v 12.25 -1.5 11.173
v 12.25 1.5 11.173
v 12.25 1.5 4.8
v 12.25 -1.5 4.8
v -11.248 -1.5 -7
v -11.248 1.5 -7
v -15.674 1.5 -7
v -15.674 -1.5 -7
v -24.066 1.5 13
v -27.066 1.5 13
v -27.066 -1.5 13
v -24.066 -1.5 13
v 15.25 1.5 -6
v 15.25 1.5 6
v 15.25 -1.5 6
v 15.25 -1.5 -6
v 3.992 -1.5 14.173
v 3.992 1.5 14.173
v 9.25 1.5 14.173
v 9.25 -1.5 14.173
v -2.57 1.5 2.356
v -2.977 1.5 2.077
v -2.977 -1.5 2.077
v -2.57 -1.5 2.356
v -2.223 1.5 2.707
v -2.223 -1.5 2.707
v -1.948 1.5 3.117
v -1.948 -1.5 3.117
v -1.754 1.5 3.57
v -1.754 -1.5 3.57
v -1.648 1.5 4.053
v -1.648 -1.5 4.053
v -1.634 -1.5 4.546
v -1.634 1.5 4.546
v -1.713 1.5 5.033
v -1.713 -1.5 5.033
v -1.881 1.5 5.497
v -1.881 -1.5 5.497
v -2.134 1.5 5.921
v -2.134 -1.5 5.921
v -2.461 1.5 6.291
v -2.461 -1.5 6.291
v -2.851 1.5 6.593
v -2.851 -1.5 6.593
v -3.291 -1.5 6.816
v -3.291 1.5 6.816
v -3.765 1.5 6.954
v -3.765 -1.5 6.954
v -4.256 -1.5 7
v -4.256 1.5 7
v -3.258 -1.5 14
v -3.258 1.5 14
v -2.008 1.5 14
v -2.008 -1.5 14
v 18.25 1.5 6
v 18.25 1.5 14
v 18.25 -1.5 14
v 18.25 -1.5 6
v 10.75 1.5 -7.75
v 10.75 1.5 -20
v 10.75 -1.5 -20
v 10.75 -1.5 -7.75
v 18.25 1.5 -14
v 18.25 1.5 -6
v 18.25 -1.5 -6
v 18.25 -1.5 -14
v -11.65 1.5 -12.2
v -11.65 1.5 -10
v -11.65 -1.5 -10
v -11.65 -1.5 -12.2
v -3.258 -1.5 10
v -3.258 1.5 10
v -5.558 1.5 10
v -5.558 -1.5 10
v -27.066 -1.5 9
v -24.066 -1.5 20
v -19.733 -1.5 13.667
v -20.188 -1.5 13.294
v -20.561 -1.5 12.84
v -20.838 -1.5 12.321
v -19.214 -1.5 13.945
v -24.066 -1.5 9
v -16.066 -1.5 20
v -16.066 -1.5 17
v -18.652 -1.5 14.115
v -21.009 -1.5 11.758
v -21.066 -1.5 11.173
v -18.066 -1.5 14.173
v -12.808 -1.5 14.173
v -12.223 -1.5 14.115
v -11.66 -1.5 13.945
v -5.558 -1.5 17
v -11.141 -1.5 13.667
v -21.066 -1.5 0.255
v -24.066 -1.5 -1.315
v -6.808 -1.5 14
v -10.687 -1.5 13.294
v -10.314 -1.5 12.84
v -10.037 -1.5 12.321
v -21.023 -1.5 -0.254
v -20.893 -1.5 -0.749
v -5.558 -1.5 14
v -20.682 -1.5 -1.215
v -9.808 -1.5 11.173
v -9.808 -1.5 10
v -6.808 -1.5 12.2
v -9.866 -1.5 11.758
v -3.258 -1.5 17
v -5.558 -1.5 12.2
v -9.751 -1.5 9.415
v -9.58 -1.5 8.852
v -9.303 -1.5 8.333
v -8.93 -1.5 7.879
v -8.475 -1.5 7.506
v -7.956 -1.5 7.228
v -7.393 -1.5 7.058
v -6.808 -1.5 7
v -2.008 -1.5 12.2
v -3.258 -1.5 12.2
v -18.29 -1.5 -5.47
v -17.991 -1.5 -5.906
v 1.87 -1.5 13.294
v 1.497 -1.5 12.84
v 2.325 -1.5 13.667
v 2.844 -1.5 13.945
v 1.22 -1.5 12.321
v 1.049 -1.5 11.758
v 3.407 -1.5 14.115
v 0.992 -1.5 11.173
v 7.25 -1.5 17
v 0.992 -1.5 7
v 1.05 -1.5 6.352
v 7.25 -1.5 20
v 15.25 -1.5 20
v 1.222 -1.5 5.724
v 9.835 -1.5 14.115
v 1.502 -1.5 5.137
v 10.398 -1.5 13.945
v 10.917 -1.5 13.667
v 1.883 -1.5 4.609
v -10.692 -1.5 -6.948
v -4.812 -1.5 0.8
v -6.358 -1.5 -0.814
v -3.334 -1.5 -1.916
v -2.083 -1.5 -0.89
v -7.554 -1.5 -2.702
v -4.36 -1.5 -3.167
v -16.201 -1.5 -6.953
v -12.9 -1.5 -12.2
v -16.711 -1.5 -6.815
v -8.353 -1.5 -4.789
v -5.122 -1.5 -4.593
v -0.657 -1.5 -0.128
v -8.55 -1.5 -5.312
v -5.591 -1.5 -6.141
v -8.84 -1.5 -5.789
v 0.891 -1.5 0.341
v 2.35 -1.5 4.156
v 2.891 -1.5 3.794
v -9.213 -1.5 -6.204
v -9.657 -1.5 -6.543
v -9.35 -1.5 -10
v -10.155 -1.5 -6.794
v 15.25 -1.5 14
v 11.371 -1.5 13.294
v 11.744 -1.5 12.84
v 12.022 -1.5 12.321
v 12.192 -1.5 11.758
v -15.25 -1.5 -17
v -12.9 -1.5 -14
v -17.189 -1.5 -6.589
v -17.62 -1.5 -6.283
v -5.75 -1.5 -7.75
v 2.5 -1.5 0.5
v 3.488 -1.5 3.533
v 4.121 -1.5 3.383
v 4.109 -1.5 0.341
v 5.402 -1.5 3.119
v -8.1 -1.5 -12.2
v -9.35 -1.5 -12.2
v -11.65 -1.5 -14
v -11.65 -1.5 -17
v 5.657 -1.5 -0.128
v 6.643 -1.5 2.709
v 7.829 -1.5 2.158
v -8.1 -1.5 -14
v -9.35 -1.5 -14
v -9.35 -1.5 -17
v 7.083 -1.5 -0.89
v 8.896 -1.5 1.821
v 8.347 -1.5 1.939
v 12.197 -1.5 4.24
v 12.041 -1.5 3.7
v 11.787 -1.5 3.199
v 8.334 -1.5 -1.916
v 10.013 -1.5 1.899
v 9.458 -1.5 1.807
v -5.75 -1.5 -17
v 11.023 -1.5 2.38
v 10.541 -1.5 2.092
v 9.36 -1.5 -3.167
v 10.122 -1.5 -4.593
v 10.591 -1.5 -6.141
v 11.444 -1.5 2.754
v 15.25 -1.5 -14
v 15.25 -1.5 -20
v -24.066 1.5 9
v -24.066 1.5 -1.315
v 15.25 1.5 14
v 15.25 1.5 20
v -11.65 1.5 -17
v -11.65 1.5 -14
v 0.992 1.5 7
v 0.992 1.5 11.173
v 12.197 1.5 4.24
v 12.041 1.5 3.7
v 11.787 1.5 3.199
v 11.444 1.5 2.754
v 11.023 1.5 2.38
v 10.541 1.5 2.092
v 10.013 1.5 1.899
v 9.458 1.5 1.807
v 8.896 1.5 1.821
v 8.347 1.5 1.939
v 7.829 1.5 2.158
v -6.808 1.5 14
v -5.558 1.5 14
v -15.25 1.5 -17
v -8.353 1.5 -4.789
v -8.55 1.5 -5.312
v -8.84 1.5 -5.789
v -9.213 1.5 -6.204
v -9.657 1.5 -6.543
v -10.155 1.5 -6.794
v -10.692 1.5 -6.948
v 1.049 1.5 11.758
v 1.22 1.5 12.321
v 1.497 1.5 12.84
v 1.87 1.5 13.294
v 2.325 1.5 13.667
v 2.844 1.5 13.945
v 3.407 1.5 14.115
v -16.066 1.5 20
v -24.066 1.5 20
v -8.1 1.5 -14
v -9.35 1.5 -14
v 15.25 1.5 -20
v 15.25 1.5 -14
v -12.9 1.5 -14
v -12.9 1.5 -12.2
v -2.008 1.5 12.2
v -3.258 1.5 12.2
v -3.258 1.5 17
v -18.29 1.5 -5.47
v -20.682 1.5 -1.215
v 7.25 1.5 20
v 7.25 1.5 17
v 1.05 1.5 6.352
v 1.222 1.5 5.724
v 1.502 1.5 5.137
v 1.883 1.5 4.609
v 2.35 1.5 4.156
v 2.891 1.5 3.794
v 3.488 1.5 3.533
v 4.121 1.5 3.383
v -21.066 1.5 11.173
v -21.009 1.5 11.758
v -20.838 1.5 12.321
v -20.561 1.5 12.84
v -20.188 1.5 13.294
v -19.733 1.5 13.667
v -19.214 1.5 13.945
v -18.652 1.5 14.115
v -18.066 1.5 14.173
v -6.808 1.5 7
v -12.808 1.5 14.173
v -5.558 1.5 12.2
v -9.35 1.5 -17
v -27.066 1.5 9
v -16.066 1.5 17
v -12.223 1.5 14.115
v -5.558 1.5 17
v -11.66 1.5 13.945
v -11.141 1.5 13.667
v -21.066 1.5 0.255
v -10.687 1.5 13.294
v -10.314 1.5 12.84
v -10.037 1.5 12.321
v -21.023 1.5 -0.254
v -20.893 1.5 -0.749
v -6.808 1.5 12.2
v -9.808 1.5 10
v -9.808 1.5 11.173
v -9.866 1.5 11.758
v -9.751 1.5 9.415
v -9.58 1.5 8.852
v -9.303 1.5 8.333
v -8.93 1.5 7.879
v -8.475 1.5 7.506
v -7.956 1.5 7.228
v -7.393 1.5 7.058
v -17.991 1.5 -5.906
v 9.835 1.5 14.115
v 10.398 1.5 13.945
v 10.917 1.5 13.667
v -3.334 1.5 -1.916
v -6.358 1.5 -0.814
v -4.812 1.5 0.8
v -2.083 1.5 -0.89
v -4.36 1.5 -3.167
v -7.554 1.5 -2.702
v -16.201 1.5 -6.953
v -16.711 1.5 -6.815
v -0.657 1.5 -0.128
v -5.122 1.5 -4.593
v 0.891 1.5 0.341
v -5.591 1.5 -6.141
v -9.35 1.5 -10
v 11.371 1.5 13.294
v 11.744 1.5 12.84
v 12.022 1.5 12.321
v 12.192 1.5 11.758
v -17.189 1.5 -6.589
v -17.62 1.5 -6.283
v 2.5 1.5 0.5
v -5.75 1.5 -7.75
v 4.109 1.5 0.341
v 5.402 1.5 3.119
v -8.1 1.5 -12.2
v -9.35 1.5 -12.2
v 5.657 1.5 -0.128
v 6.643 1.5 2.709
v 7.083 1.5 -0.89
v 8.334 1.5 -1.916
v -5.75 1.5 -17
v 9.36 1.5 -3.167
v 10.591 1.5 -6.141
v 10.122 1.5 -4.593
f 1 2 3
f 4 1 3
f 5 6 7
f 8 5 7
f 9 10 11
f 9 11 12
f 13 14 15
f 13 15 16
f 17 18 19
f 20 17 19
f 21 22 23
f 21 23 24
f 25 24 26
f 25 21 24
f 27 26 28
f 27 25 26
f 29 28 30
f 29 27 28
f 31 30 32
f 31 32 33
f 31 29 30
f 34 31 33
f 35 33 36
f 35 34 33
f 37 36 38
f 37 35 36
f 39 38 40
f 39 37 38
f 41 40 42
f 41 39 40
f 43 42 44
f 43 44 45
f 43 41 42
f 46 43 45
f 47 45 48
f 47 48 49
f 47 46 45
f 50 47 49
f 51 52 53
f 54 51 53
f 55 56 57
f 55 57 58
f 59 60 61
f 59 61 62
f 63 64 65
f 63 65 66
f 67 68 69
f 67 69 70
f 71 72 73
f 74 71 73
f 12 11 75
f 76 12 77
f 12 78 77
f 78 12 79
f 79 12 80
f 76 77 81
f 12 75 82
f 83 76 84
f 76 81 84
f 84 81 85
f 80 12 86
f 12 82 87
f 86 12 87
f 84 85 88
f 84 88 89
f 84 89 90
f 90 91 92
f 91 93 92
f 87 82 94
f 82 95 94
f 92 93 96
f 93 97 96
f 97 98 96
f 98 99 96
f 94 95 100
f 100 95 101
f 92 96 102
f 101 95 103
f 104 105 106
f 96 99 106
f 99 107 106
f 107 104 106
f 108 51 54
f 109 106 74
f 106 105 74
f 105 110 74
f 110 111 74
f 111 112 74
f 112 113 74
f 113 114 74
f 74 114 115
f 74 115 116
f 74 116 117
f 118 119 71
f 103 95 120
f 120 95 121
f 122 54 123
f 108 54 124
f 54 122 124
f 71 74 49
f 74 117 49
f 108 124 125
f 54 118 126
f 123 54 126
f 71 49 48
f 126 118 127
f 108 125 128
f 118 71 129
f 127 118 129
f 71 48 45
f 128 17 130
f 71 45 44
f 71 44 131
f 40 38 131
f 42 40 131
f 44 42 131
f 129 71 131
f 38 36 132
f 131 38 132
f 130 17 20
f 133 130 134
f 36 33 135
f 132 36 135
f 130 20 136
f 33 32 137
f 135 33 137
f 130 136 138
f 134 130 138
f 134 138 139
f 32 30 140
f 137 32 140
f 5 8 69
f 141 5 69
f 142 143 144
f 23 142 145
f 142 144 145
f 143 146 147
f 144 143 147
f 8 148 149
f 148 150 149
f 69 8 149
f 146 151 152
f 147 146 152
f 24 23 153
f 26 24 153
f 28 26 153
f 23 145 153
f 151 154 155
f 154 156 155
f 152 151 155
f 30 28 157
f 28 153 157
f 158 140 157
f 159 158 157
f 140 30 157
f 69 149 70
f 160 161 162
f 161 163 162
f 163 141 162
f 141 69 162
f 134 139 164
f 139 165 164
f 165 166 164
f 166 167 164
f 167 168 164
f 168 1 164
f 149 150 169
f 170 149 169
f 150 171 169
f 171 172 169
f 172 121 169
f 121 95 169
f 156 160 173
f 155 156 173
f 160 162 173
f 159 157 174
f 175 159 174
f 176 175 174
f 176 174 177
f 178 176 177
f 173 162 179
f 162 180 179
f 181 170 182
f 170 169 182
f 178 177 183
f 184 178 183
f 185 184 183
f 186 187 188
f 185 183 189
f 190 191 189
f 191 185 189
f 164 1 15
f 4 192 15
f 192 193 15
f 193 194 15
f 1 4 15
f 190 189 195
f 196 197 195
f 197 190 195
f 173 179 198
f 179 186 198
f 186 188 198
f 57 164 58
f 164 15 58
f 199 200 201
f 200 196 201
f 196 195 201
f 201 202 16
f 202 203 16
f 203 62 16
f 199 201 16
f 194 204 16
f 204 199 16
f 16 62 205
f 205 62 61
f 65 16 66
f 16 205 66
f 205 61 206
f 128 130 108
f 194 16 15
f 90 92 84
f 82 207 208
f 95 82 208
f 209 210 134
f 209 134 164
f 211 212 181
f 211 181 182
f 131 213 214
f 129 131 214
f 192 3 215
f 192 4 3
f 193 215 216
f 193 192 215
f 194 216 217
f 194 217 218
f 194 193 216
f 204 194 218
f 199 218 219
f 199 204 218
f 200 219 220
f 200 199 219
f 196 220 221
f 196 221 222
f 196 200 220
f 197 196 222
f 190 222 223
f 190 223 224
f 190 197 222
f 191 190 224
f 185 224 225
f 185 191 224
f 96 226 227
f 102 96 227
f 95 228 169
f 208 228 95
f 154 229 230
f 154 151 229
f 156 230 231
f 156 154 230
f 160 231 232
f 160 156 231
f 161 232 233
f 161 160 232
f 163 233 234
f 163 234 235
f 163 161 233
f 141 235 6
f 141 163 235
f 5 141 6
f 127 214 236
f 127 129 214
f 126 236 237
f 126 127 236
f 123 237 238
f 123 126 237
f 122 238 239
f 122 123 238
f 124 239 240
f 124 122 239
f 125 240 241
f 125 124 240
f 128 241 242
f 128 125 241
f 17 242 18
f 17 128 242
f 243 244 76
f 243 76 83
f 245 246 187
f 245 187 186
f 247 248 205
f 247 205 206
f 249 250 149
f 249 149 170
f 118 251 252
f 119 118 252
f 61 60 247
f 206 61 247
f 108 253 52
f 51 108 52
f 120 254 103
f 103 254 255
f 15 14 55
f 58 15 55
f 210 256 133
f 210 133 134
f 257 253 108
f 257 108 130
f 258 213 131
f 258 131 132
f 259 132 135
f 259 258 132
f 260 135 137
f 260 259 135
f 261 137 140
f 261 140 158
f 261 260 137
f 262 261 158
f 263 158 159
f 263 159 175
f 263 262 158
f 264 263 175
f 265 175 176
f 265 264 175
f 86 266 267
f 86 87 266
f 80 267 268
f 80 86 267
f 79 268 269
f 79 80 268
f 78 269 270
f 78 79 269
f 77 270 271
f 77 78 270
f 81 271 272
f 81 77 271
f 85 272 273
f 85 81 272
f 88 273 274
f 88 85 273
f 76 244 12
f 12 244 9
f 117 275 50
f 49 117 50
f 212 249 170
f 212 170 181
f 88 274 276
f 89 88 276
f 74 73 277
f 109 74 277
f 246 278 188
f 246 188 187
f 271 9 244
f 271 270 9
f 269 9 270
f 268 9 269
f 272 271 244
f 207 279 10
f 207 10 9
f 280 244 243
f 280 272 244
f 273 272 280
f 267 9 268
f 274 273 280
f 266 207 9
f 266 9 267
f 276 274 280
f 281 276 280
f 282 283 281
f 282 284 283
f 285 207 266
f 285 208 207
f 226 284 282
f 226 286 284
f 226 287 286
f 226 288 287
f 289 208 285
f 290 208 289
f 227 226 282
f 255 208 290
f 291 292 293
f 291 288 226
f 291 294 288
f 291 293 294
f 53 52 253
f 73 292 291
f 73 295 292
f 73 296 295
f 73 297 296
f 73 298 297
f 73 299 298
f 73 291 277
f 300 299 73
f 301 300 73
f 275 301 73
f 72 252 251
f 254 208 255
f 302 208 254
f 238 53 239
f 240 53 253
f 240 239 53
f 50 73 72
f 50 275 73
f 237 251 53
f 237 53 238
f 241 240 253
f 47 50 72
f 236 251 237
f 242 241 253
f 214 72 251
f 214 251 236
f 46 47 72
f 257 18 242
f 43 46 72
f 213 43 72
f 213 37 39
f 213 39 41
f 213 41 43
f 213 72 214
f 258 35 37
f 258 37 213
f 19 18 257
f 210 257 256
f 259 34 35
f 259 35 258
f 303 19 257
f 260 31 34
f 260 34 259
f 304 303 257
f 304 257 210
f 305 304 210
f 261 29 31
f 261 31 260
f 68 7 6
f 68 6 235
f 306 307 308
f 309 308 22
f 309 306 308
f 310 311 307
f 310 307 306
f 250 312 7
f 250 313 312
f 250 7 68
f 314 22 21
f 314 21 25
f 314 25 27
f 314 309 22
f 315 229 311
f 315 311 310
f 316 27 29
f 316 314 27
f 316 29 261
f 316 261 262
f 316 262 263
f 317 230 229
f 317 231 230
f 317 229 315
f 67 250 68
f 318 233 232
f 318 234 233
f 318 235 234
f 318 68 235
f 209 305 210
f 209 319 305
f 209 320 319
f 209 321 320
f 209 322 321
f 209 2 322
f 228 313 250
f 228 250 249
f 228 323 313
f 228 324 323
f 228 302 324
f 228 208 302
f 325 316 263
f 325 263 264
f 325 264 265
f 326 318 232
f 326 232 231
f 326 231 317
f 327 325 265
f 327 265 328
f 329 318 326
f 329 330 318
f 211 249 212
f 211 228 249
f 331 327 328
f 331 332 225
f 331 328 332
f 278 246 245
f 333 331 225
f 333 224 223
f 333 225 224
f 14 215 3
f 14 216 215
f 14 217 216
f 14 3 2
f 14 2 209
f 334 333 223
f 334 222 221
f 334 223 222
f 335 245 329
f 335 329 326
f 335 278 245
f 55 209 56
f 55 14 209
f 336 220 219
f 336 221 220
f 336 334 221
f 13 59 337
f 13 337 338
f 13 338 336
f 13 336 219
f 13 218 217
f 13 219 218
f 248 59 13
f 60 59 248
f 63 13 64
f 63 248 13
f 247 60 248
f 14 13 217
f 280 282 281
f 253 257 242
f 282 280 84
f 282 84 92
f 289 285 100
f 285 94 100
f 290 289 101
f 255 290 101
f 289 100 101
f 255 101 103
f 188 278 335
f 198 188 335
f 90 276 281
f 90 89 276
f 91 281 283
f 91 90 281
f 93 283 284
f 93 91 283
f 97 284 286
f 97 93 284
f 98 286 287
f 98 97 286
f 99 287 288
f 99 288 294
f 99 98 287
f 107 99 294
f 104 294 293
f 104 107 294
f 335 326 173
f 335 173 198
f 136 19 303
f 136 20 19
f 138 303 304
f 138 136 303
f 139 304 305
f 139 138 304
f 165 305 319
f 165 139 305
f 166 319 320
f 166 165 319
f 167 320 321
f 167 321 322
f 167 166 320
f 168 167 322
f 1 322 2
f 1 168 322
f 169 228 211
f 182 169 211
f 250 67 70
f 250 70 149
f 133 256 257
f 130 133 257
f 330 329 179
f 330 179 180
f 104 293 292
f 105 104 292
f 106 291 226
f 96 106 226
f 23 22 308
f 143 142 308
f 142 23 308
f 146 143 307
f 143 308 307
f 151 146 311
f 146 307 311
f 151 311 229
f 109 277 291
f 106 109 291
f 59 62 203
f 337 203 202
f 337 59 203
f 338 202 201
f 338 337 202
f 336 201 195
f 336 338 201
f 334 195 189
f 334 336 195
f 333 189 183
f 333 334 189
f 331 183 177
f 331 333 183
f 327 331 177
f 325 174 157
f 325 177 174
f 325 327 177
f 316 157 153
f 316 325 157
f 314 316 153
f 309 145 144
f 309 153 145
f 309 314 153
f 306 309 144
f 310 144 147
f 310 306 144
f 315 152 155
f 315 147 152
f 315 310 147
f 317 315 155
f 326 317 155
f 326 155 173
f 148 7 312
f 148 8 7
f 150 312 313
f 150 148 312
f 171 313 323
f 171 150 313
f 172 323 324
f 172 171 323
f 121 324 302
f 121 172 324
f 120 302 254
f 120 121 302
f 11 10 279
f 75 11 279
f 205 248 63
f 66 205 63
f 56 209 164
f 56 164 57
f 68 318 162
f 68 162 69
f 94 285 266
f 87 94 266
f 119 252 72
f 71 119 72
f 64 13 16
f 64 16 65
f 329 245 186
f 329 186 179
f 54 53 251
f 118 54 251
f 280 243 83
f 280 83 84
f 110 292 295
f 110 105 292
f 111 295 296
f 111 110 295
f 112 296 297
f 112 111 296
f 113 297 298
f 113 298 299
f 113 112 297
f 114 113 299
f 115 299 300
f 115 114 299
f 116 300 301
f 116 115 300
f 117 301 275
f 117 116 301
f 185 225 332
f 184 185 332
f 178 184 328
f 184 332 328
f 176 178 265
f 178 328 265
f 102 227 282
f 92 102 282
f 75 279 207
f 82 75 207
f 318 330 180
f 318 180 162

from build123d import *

# Parameters (mm, degrees)
SKETCH1_W           = 30.5
SKETCH1_H           = 34
BOSS_EXTRUDE1_DEPTH = 1.5
BOSS_EXTRUDE2_DEPTH = 3
SKETCH3_W           = 3
SKETCH3_H           = 8
SKETCH3_W_2         = 8
SKETCH3_H_2         = 3
BOSS_EXTRUDE3_DEPTH = 3
CUT_EXTRUDE1_DEPTH  = 4.0000001
CUT_EXTRUDE2_DEPTH  = 4.0000001
SKETCH6_W           = 8
SKETCH6_H           = 3
CUT_EXTRUDE3_DEPTH  = 4.0000001
CUT_EXTRUDE4_DEPTH  = 4.0000001
CUT_EXTRUDE6_DEPTH  = 4.0000001
SKETCH9_W           = 3
SKETCH9_H           = 4
BOSS_EXTRUDE4_DEPTH = 3
CUT_EXTRUDE7_DEPTH  = 4
FILLET1_R           = 3
BOSS_EXTRUDE5_DEPTH = 3


with BuildPart() as part:
    # Sketch1 → Boss-Extrude1 (new body, symmetric)
    with BuildSketch(Plane(origin=(0, 0, 0), x_dir=(1, 0, 0), z_dir=(0, 1, 0))):
        Rectangle(SKETCH1_W, SKETCH1_H)
    extrude(amount=BOSS_EXTRUDE1_DEPTH, both=True)

    # Sketch2 → Boss-Extrude2 (add)
    with BuildSketch(Plane(origin=(0, 1.5, 0), x_dir=(1, 0, 0), z_dir=(0, 1, 0))):
        with BuildLine():
            Line((-15.25, 17), (-24.07, 1.308996208))
            add(Edge.make_bspline(
                [(-24.07, 1.308996208), (-25.612124036, -1.43448158), (-30.226003395, -1.5229993), (-46.69780929, -11.088418218), (-55.382760657, -10.307171359), (-55.382760657, -17)],
                knots=[0, 0, 0, 0, 0.221130071, 0.603599568, 1, 1, 1, 1], degree=3))
            Line((-55.382760657, -17), (-15.25, -17))
            Line((-15.25, -17), (-15.25, 17))
        make_face()
    extrude(amount=-BOSS_EXTRUDE2_DEPTH)

    # Sketch3 → Boss-Extrude3 (add)
    with BuildSketch(Plane(origin=(0, 1.5, 0), x_dir=(1, 0, 0), z_dir=(0, 1, 0))):
        with Locations((16.75, 10)):
            Rectangle(SKETCH3_W, SKETCH3_H)
        with Locations((16.75, -10)):
            Rectangle(SKETCH3_W, SKETCH3_H)
        with Locations((-11.25, 18.5)):
            Rectangle(SKETCH3_W_2, SKETCH3_H_2)
        with Locations((11.25, 18.5)):
            Rectangle(SKETCH3_W_2, SKETCH3_H_2)
        with Locations((-51.382760657, -18.5)):
            Rectangle(SKETCH3_W_2, SKETCH3_H_2)
        with Locations((11.25, -18.5)):
            Rectangle(SKETCH3_W_2, SKETCH3_H_2)
        with Locations((-20.066380328, -18.5)):
            Rectangle(SKETCH3_W_2, SKETCH3_H_2)
    extrude(amount=-BOSS_EXTRUDE3_DEPTH)

    # Sketch4 → Cut-Extrude1 (cut, through all)
    with BuildSketch(Plane(origin=(0, 1.5, 0), x_dir=(1, 0, 0), z_dir=(0, 1, 0))):
        Polygon((-2.008190164, -14), (-2.008190164, -12.2), (-3.258190164, -12.2), (-3.258190164, -10), (-5.558190164, -10), (-5.558190164, -12.2), (-6.808190164, -12.2), (-6.808190164, -14), (-5.558190164, -14), (-5.558190164, -17), (-3.258190164, -17), (-3.258190164, -14), align=None)
        Polygon((-33.324570493, -14), (-33.324570493, -12.2), (-34.574570493, -12.2), (-34.574570493, -10), (-36.874570493, -10), (-36.874570493, -12.2), (-38.124570493, -12.2), (-38.124570493, -14), (-36.874570493, -14), (-36.874570493, -17), (-34.574570493, -17), (-34.574570493, -14), align=None)
    extrude(amount=-CUT_EXTRUDE1_DEPTH, mode=Mode.SUBTRACT)

    # Sketch5 → Cut-Extrude2 (cut, through all)
    with BuildSketch(Plane(origin=(0, 1.5, 0), x_dir=(1, 0, 0), z_dir=(0, 1, 0))):
        with BuildLine():
            Line((10.75, 20), (10.75, 7.75))
            ThreePointArc((10.75, 7.75), (2.5, -0.5), (-5.75, 7.75))
            Line((-5.75, 7.75), (-5.75, 20))
            Line((-5.75, 20), (10.75, 20))
        make_face()
    extrude(amount=-CUT_EXTRUDE2_DEPTH, mode=Mode.SUBTRACT)

    # Sketch6 → Cut-Extrude3 (cut, through all)
    with BuildSketch(Plane(origin=(0, 1.5, 0), x_dir=(1, 0, 0), z_dir=(0, 1, 0))):
        with Locations((-11.25, 18.5)):
            Rectangle(SKETCH6_W, SKETCH6_H)
    extrude(amount=-CUT_EXTRUDE3_DEPTH, mode=Mode.SUBTRACT)

    # Sketch7 → Cut-Extrude4 (cut, through all)
    with BuildSketch(Plane(origin=(0, 1.5, 0), x_dir=(1, 0, 0), z_dir=(0, 1, 0))):
        Polygon((-11.65, 17), (-9.35, 17), (-9.35, 14), (-8.1, 14), (-8.1, 12.2), (-9.35, 12.2), (-9.35, 10), (-11.65, 10), (-11.65, 12.2), (-12.9, 12.2), (-12.9, 14), (-11.65, 14), align=None)
    extrude(amount=-CUT_EXTRUDE4_DEPTH, mode=Mode.SUBTRACT)

    # Sketch8 → Cut-Extrude6 (cut, through all)
    with BuildSketch(Plane(origin=(0, 1.5, 0), x_dir=(1, 0, 0), z_dir=(0, 1, 0))):
        with BuildLine():
            Line((-24.066380328, -17), (-24.066380328, 1.315435696))
            Line((-24.066380328, 1.315435696), (-24.07, 1.308996208))
            add(Edge.make_bspline(
                [(-24.07, 1.308996208), (-25.612124036, -1.43448158), (-30.226003395, -1.5229993), (-46.69780929, -11.088418218), (-55.382760657, -10.307171359), (-55.382760657, -17)],
                knots=[0, 0, 0, 0, 0.221130071, 0.603599568, 1, 1, 1, 1], degree=3))
            Line((-55.382760657, -17), (-55.382760657, -20))
            Line((-55.382760657, -20), (-47.382760657, -20))
            Line((-47.382760657, -20), (-47.382760657, -17))
            Line((-47.382760657, -17), (-36.874570493, -17))
            Line((-36.874570493, -17), (-36.874570493, -14))
            Line((-36.874570493, -14), (-38.124570493, -14))
            Line((-38.124570493, -14), (-38.124570493, -12.2))
            Line((-38.124570493, -12.2), (-36.874570493, -12.2))
            Line((-36.874570493, -12.2), (-36.874570493, -10))
            Line((-36.874570493, -10), (-34.574570493, -10))
            Line((-34.574570493, -10), (-34.574570493, -12.2))
            Line((-34.574570493, -12.2), (-33.324570493, -12.2))
            Line((-33.324570493, -12.2), (-33.324570493, -14))
            Line((-33.324570493, -14), (-34.574570493, -14))
            Line((-34.574570493, -14), (-34.574570493, -17))
            Line((-34.574570493, -17), (-24.066380328, -17))
        make_face()
    extrude(amount=-CUT_EXTRUDE6_DEPTH, mode=Mode.SUBTRACT)

    # Sketch9 → Boss-Extrude4 (add)
    with BuildSketch(Plane(origin=(0, 1.5, 0), x_dir=(1, 0, 0), z_dir=(0, 1, 0))):
        with Locations((-25.566380328, -11)):
            Rectangle(SKETCH9_W, SKETCH9_H)
    extrude(amount=-BOSS_EXTRUDE4_DEPTH)

    # Sketch10 → Cut-Extrude7 (cut, through all)
    with BuildSketch(Plane(origin=(0, 1.5, 0), x_dir=(1, 0, 0), z_dir=(0, 1, 0))):
        with BuildLine():
            Line((-21.066380328, 0.530062836), (-21.066380328, -14.173024042))
            Line((-21.066380328, -14.173024042), (-9.808190164, -14.173024042))
            Line((-9.808190164, -14.173024042), (-9.808190164, -7))
            Line((-9.808190164, -7), (0.991809836, -7))
            Line((0.991809836, -7), (0.991809836, -14.173024042))
            Line((0.991809836, -14.173024042), (12.25, -14.173024042))
            Line((12.25, -14.173024042), (12.25, 2.13751392))
            ThreePointArc((12.25, 2.13751392), (-0.04063544, -3.20936456), (-8.72497216, 7))
            Line((-8.72497216, 7), (-17.429592871, 7))
            Line((-17.429592871, 7), (-21.066380328, 0.530062836))
        make_face()
    extrude(amount=-CUT_EXTRUDE7_DEPTH, mode=Mode.SUBTRACT)

    # Fillet1
    fillet1_edges = [part.edges().sort_by_distance(p)[0] for p in [
        (-21.066380328, 0, -0.530062836),
        (-17.429592871, 0, -7),
        (-8.72497216, 0, -7),
        (12.25, 0, -2.13751392),
        (12.25, 0, 14.173024042),
        (0.991809836, 0, 14.173024042),
        (-9.808190164, 0, 7),
        (-9.808190164, 0, 14.173024042),
        (-21.066380328, 0, 14.173024042),
    ]]
    fillet(fillet1_edges, radius=FILLET1_R)

    # Sketch11 → Boss-Extrude5 (add)
    with BuildSketch(Plane(origin=(0, 1.5, 0), x_dir=(1, 0, 0), z_dir=(0, 1, 0))):
        with BuildLine():
            Line((-4.256338517, -7), (0.991809836, -7))
            ThreePointArc((0.991809836, -7), (1.882552513, -4.608606487), (4.120680317, -3.382649968))
            ThreePointArc((4.120680317, -3.382649968), (0.464289311, -3.31428407), (-2.97698799, -2.076754426))
            ThreePointArc((-2.97698799, -2.076754426), (-1.712960608, -5.03307181), (-4.256338517, -7))
        make_face()
    extrude(amount=-BOSS_EXTRUDE5_DEPTH)


solid = part.part
